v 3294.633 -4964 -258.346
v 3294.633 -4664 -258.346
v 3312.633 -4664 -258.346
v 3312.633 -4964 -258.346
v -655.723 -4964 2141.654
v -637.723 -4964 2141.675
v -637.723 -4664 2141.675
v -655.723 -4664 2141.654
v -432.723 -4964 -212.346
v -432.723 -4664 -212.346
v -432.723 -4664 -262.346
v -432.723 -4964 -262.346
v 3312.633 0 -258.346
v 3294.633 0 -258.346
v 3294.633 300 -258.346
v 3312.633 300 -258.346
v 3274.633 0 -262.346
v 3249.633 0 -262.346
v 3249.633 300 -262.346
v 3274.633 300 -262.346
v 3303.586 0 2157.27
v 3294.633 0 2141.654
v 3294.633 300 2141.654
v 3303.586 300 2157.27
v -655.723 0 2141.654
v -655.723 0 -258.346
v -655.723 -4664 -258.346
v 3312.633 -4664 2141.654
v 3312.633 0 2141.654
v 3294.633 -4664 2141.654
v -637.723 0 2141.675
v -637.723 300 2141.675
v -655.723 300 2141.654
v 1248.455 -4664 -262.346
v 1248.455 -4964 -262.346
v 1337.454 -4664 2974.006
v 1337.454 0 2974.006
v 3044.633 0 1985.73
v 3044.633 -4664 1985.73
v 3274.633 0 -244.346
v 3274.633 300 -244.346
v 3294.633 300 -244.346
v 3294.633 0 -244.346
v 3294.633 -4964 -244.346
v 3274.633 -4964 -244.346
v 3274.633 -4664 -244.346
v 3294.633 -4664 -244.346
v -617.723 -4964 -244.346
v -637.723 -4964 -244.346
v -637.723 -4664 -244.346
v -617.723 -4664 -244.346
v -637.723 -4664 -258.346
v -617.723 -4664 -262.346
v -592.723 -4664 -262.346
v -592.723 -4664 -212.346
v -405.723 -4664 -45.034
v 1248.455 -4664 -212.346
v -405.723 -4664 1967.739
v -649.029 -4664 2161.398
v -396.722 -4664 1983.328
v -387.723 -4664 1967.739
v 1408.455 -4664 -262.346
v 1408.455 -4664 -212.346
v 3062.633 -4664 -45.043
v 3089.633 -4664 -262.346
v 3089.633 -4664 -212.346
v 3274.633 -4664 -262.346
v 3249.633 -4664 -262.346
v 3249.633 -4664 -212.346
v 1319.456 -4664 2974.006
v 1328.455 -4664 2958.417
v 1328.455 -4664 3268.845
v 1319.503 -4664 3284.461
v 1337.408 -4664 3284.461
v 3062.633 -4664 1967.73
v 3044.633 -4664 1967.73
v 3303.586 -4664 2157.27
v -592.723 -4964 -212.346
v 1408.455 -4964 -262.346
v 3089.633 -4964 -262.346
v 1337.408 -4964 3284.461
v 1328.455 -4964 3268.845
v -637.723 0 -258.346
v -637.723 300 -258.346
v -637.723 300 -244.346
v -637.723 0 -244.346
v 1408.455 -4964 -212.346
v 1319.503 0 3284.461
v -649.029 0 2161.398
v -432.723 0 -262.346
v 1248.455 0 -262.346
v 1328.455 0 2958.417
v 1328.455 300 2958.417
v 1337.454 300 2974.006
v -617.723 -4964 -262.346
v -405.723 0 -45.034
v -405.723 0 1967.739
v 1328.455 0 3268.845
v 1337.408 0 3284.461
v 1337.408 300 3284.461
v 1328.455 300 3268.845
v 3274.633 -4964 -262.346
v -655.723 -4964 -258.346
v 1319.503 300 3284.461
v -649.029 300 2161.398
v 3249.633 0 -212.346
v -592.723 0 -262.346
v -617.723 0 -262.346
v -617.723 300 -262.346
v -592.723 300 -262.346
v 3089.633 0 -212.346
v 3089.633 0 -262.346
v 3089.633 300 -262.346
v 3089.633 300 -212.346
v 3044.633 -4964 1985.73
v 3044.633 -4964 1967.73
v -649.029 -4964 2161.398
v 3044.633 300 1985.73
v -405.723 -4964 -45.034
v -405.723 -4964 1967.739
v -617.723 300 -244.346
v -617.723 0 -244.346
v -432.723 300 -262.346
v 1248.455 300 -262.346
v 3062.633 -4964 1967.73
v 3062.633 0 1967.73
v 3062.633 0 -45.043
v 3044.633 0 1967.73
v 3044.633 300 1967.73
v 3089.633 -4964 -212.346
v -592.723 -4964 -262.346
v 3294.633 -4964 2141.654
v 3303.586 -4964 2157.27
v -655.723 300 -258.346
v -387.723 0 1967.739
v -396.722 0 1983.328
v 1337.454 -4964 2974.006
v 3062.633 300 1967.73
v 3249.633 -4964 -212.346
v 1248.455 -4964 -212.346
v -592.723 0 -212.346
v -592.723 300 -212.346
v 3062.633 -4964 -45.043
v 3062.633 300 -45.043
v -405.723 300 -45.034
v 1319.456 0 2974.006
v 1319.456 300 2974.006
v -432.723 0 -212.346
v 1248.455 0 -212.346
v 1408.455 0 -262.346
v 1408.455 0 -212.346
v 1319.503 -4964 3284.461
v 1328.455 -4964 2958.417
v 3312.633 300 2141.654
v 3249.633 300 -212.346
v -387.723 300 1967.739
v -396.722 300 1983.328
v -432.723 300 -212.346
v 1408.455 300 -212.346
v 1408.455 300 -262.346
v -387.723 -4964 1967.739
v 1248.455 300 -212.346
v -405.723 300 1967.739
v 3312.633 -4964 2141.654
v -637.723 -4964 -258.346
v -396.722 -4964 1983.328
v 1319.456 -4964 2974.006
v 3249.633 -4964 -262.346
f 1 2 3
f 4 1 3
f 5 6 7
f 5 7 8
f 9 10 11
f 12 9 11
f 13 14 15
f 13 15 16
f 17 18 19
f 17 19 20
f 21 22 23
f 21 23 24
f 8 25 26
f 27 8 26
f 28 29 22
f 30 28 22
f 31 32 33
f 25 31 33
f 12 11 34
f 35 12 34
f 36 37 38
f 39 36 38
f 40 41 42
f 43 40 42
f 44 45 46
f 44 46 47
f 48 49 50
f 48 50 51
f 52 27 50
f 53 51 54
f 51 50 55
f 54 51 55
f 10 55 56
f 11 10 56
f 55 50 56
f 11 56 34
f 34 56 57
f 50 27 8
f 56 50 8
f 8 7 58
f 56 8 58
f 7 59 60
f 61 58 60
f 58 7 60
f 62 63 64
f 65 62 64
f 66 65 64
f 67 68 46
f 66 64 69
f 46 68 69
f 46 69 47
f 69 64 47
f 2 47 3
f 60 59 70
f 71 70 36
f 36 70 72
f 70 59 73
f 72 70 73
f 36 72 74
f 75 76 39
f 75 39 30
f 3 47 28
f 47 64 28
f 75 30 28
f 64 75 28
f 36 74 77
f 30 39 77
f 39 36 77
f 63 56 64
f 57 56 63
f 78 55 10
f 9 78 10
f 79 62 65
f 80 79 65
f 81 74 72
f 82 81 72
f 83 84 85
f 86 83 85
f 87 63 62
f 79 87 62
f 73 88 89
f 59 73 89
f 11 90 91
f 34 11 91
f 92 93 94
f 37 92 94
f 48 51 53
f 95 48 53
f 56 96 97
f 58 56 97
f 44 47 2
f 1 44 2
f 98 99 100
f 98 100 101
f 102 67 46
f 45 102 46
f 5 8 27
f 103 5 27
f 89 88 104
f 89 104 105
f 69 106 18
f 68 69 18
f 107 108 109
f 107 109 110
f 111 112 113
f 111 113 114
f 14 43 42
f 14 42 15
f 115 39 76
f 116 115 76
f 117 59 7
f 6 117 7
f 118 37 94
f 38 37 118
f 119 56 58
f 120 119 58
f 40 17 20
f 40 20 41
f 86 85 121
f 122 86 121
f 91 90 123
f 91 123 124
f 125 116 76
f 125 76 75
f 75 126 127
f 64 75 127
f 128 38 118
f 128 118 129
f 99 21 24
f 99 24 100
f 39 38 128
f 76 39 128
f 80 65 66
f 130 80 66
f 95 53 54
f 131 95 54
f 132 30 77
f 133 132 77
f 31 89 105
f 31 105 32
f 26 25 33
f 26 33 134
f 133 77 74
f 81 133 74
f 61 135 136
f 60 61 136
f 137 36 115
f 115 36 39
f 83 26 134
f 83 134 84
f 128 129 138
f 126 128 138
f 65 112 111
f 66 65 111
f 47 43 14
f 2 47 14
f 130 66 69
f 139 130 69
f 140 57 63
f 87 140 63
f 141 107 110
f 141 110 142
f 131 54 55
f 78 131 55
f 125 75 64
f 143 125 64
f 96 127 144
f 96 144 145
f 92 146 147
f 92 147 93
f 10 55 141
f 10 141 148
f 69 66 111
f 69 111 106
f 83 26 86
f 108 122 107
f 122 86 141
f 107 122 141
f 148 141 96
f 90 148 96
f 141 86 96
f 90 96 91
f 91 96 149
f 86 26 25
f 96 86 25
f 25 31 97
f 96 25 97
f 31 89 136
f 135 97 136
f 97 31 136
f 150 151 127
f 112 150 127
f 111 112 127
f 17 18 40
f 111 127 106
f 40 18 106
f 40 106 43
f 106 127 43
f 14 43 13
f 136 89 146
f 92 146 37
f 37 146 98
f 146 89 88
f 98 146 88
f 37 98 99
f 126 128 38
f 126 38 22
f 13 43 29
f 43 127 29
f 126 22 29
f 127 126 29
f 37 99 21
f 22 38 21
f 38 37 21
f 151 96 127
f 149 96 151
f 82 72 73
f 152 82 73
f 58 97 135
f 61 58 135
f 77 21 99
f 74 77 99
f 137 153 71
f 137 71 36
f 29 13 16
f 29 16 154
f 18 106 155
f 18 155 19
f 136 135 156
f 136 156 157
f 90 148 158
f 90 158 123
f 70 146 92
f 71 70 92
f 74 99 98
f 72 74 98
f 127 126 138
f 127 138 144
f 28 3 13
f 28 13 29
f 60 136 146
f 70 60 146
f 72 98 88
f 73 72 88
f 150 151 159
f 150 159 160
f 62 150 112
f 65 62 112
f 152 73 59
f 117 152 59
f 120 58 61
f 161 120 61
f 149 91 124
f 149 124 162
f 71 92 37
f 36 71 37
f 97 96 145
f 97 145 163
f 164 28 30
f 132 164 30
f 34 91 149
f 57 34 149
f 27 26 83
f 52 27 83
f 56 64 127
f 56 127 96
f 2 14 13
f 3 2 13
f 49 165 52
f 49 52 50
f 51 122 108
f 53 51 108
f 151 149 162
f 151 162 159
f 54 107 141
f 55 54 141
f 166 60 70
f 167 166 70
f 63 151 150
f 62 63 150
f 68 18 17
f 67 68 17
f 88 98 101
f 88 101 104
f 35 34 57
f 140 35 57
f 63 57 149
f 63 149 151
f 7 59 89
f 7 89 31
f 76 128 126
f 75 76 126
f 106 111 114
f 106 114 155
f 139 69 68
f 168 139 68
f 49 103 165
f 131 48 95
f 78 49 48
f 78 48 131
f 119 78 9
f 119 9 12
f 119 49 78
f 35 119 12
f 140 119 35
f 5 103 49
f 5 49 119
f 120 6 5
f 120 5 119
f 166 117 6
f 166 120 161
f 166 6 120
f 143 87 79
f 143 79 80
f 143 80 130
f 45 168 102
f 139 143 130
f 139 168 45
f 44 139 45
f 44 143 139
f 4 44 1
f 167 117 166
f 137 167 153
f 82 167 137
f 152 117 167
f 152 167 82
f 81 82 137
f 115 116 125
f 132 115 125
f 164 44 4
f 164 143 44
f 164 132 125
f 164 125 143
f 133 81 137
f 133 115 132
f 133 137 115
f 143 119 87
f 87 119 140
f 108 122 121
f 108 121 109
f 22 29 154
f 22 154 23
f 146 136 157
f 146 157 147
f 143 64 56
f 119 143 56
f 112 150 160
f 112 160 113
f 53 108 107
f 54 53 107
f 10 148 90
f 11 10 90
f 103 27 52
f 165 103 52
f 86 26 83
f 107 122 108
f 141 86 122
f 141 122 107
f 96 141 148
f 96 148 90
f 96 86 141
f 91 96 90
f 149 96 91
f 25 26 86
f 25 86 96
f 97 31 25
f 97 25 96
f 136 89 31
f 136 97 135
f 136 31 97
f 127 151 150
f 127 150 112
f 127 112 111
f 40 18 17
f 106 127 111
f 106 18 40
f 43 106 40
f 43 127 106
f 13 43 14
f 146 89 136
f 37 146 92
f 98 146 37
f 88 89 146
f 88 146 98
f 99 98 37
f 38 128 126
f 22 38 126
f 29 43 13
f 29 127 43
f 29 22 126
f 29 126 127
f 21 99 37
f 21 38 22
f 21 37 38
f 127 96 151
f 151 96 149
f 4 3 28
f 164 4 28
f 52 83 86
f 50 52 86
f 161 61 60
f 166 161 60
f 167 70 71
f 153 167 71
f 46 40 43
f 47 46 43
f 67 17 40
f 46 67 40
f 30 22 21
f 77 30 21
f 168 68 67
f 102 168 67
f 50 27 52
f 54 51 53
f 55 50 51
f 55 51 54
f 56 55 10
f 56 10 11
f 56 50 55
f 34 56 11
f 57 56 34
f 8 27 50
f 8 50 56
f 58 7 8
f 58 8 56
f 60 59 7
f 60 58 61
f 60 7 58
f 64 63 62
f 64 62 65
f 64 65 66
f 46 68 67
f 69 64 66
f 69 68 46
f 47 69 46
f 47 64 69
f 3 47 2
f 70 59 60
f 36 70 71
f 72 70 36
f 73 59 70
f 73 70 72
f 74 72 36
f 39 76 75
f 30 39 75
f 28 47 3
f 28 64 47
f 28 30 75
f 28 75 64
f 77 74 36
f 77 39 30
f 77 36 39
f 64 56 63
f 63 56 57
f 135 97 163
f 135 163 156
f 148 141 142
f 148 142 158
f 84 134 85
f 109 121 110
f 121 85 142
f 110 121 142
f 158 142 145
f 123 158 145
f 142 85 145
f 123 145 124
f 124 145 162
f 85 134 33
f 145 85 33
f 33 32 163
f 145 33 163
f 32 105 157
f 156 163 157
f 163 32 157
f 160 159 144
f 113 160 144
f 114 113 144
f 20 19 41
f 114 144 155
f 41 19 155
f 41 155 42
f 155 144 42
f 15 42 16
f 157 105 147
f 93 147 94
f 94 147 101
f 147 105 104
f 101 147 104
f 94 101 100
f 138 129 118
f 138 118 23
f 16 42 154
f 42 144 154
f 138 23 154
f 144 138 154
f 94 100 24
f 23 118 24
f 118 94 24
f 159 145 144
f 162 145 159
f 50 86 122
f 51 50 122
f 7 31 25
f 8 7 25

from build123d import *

# Parameters (mm, degrees)
F1_DEPTH = 4664
F2_DEPTH = 300
F3_DEPTH = 300


with BuildPart() as f1:
    # F0 (on Front) → F1 (new body)
    with BuildSketch(Plane.XZ):
        Polygon((3294.6332816305, -244.3458880704), (3294.6332816305, -258.3458880704), (3312.6332816305, -258.3458880704), (3312.6332816305, 2141.6541119296), (3294.6332816305, 2141.6541119296), align=None)
        Polygon((3274.6332816305, -244.3458880704), (3294.6332816305, -244.3458880704), (3294.6332816305, 2141.6541119296), (2775.2804956467, 2141.656879555), (3044.6332816305, 1985.7301119296), (3044.6332816305, 1967.7301119296), (3062.6332816303, 1967.7300208224), (3062.6332816305, -9.0428880704), (3062.6332816305, -27.0428880704), (3062.6332816305, -45.0428880704), (1328.4552816305, -45.0384992861), (1328.4552816305, -212.3458880704), (1408.4552816305, -212.3458880704), (1408.4552816305, -262.3458880704), (3089.6332816305, -262.3458880704), (3089.6332816305, -212.3458880704), (3249.6332816305, -212.3458880704), (3249.6332816305, -262.3458880704), (3274.6332816305, -262.3458880704), align=None)
        Polygon((2775.2804956467, 2141.656879555), (3294.6332816305, 2141.6541119296), (1328.4552816305, 3268.8451119296), (1328.4552816305, 2976.4171119296), (1328.4552816305, 2958.4171119296), (1337.4542676775, 2974.0061545598), align=None)
        Polygon((1328.4552816305, 3268.8451119296), (3294.6332816305, 2141.6541119296), (3303.5856912375, 2157.2699488342), (1337.4076912375, 3284.4609488342), align=None)
        Polygon((1328.4552816305, 2976.4171119296), (1328.4552816305, 3268.8451119296), (-637.7227183695, 2141.6750674118), (-122.4174122387, 2141.6723213555), (1319.4563547663, 2974.0061887237), (1328.4552816305, 2958.4171119296), align=None)
        Polygon((-637.7227183695, 2141.6750674118), (1328.4552816305, 3268.8451119296), (1319.5029972882, 3284.4610206465), (-649.0292205303, 2161.3975537515), align=None)
        Polygon((-122.4174122387, 2141.6723213555), (-637.7227183695, 2141.6750674118), (-637.7227183695, -244.3458880704), (-617.7227183695, -244.3458880704), (-617.7227183695, -262.3458880704), (-592.7227183695, -262.3458880704), (-592.7227183695, -212.3458880704), (-432.7227183695, -212.3458880704), (-432.7227183695, -262.3458880704), (1248.4552816305, -262.3458880704), (1248.4552816305, -212.3458880704), (1328.4552816305, -212.3458880704), (1328.4552816305, -45.0384992861), (-405.7227183693, -45.0341105019), (-405.7227183693, -27.0341105019), (-405.7227183693, -9.0341105019), (-405.7227183695, 1967.7387983908), (-387.7227183695, 1967.7387983908), (-396.7216452337, 1983.3278751849), align=None)
        Polygon((-637.7227183695, -244.3458880704), (-637.7227183695, 2141.6750674118), (-655.7227183695, 2141.6541119296), (-655.7227183695, -258.3458880704), (-637.7227183695, -258.3458880704), align=None)
    extrude(amount=F1_DEPTH)


with BuildPart() as f2:
    # F2 (new): a face of the model
    f2_faces = [f1.part.faces().sort_by_distance(p)[0] for p in [
        (3299.955657847, -4664, -251.3458880704),
    ]]
    extrude(f2_faces, amount=F2_DEPTH)


with BuildPart() as f3:
    # F3 (new): a face of the model
    f3_faces = [f1.part.faces().sort_by_distance(p)[0] for p in [
        (3299.955657847, 0, -251.3458880704),
    ]]
    extrude(f3_faces, amount=F3_DEPTH)


solid = Compound([f1.part, f2.part, f3.part])
